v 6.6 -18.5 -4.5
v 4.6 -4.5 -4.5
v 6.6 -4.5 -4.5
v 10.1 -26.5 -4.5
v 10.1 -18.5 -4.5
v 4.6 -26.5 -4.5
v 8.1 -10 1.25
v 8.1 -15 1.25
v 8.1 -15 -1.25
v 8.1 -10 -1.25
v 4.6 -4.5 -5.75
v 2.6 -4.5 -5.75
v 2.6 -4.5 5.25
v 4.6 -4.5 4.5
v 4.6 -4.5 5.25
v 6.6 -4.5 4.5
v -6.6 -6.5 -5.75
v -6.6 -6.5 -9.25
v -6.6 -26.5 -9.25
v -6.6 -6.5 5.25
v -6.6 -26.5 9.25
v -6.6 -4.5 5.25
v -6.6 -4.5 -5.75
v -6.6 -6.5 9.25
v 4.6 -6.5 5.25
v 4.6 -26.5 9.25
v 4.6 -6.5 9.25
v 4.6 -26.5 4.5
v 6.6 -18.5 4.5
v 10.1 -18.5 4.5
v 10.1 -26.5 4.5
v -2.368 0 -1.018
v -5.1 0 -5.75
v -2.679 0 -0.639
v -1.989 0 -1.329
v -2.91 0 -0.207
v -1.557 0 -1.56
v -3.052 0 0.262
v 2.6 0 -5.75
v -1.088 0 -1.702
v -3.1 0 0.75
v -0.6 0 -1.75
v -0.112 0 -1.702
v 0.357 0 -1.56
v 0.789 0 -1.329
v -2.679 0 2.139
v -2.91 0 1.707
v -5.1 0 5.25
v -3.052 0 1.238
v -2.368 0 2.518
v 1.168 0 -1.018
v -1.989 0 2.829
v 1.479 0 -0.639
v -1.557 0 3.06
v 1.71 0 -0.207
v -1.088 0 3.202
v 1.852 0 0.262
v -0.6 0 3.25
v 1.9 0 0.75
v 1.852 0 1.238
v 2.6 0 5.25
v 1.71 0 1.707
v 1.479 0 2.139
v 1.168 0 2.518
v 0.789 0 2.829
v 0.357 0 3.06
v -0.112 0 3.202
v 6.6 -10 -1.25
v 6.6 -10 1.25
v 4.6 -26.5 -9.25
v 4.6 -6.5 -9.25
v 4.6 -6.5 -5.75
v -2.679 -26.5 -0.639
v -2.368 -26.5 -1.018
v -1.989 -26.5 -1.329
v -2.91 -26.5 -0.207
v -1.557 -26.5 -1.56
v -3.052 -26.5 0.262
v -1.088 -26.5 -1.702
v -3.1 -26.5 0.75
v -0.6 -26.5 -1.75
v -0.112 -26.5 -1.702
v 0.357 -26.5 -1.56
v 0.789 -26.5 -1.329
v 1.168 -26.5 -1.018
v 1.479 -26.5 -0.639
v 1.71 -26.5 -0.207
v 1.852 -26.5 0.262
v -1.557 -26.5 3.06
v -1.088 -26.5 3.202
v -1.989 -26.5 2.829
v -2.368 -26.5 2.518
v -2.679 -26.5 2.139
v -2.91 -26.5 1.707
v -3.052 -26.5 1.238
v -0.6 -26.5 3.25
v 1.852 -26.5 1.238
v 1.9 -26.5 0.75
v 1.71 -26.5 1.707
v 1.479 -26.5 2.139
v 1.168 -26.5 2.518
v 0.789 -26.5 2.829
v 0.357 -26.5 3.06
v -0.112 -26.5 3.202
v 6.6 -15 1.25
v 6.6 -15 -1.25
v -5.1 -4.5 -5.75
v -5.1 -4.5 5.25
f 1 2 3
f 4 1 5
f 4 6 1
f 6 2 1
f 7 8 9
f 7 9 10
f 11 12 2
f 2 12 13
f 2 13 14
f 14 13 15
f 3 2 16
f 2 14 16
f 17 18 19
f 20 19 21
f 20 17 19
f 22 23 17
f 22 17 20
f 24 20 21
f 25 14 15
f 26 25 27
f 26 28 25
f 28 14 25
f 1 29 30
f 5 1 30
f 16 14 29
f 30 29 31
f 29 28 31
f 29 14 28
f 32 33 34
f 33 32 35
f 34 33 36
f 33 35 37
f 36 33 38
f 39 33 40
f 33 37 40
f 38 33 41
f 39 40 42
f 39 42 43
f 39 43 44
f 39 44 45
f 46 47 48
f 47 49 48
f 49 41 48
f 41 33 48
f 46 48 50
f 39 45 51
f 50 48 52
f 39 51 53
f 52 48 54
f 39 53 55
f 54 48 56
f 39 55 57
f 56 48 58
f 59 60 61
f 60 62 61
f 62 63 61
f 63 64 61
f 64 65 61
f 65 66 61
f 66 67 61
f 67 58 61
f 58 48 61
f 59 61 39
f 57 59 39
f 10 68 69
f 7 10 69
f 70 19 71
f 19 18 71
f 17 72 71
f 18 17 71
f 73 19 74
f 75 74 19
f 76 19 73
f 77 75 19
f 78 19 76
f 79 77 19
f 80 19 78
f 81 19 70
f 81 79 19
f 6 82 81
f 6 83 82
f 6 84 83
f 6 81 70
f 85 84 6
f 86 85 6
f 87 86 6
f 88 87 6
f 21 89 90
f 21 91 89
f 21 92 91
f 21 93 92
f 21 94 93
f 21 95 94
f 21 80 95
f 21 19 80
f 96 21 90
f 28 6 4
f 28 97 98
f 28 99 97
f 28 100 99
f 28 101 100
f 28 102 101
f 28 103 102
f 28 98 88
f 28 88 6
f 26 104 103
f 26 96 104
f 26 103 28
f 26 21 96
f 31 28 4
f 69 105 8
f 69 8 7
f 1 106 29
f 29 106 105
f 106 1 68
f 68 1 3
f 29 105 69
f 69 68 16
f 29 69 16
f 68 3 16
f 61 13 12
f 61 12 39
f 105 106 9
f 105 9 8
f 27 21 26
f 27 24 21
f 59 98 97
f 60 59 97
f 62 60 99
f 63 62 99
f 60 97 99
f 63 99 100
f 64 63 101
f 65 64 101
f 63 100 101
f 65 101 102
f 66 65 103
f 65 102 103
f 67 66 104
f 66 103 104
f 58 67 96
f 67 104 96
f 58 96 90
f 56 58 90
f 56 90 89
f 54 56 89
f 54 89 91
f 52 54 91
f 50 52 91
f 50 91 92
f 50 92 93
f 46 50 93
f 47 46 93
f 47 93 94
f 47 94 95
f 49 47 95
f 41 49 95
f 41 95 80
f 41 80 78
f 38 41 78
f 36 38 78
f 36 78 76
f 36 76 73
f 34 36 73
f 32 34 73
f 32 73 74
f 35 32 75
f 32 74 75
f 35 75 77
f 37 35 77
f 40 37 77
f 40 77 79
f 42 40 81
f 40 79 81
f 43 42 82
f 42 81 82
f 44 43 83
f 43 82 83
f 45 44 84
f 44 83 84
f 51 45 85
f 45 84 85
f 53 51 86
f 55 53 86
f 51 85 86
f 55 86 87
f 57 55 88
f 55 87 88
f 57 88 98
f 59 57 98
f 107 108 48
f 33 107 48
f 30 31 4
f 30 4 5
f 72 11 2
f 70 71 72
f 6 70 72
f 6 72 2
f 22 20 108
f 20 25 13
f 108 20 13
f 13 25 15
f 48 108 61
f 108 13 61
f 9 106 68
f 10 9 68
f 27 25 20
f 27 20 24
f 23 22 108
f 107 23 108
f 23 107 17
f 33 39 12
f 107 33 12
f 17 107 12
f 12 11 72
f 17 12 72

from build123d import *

# Parameters (mm, degrees)
F0_W      = 13.2
F0_H      = 18.5
F1_DEPTH  = 26.5
F2_W      = 4
F2_H      = 4.5
F2_W_2    = 1.5
F3_DEPTH  = 18.501
F4_W      = 5
F4_H      = 2.5
F5_DEPTH  = 1.5
F6_W      = 6.5
F6_H      = 4
F7_DEPTH  = 13.201
F8_W      = 3.5
F8_H      = 8
F9_DEPTH  = 18.5
F10_R     = 2.5
F11_DEPTH = 26.501
F12_W     = 5.5
F12_H     = 4.75
F13_DEPTH = 26.501


with BuildPart() as f1:
    # F0 (on Front) → F1 (new body)
    with BuildSketch(Plane.XZ):
        Rectangle(F0_W, F0_H)
    extrude(amount=F1_DEPTH)

    # F2 (on face) → F3 (cut, through all)
    with BuildSketch(Plane.XY.offset(9.25)):
        with Locations((4.6, -2.25)):
            Rectangle(F2_W, F2_H)
        with Locations((-5.85, -2.25)):
            Rectangle(F2_W_2, F2_H)
    extrude(amount=-F3_DEPTH, mode=Mode.SUBTRACT)

    # F4 (on face) → F5 (join)
    with BuildSketch(Plane.YZ.offset(6.6)):
        with Locations((-12.5, 0)):
            Rectangle(F4_W, F4_H)
    extrude(amount=F5_DEPTH)

    # F6 (on face) → F7 (cut, through all)
    with BuildSketch(Plane.YZ.offset(6.6)):
        Polygon((-4.5, -9.25), (0, -9.25), (0, -5.75), (-6.5, -5.75), (-6.5, -9.25), align=None)
        with Locations((-3.25, 7.25)):
            Rectangle(F6_W, F6_H)
    extrude(amount=-F7_DEPTH, mode=Mode.SUBTRACT)

    # F8 (on face) → F9 (join, through all)
    with BuildSketch(Plane.XY.offset(9.25)):
        with Locations((8.35, -22.5)):
            Rectangle(F8_W, F8_H)
    extrude(amount=-F9_DEPTH)

    # F10 (on face) → F11 (cut, through all)
    with BuildSketch(Plane.XZ.offset(26.5)):
        with Locations((-0.6, 0.75)):
            Circle(F10_R)
    extrude(amount=-F11_DEPTH, mode=Mode.SUBTRACT)

    # F12 (on face) → F13 (cut, through all)
    with BuildSketch(Plane.XZ.offset(26.5)):
        with Locations((7.35, 6.875)):
            Rectangle(F12_W, F12_H)
        with Locations((7.35, -6.875)):
            Rectangle(F12_W, F12_H)
    extrude(amount=-F13_DEPTH, mode=Mode.SUBTRACT)


solid = f1.part
